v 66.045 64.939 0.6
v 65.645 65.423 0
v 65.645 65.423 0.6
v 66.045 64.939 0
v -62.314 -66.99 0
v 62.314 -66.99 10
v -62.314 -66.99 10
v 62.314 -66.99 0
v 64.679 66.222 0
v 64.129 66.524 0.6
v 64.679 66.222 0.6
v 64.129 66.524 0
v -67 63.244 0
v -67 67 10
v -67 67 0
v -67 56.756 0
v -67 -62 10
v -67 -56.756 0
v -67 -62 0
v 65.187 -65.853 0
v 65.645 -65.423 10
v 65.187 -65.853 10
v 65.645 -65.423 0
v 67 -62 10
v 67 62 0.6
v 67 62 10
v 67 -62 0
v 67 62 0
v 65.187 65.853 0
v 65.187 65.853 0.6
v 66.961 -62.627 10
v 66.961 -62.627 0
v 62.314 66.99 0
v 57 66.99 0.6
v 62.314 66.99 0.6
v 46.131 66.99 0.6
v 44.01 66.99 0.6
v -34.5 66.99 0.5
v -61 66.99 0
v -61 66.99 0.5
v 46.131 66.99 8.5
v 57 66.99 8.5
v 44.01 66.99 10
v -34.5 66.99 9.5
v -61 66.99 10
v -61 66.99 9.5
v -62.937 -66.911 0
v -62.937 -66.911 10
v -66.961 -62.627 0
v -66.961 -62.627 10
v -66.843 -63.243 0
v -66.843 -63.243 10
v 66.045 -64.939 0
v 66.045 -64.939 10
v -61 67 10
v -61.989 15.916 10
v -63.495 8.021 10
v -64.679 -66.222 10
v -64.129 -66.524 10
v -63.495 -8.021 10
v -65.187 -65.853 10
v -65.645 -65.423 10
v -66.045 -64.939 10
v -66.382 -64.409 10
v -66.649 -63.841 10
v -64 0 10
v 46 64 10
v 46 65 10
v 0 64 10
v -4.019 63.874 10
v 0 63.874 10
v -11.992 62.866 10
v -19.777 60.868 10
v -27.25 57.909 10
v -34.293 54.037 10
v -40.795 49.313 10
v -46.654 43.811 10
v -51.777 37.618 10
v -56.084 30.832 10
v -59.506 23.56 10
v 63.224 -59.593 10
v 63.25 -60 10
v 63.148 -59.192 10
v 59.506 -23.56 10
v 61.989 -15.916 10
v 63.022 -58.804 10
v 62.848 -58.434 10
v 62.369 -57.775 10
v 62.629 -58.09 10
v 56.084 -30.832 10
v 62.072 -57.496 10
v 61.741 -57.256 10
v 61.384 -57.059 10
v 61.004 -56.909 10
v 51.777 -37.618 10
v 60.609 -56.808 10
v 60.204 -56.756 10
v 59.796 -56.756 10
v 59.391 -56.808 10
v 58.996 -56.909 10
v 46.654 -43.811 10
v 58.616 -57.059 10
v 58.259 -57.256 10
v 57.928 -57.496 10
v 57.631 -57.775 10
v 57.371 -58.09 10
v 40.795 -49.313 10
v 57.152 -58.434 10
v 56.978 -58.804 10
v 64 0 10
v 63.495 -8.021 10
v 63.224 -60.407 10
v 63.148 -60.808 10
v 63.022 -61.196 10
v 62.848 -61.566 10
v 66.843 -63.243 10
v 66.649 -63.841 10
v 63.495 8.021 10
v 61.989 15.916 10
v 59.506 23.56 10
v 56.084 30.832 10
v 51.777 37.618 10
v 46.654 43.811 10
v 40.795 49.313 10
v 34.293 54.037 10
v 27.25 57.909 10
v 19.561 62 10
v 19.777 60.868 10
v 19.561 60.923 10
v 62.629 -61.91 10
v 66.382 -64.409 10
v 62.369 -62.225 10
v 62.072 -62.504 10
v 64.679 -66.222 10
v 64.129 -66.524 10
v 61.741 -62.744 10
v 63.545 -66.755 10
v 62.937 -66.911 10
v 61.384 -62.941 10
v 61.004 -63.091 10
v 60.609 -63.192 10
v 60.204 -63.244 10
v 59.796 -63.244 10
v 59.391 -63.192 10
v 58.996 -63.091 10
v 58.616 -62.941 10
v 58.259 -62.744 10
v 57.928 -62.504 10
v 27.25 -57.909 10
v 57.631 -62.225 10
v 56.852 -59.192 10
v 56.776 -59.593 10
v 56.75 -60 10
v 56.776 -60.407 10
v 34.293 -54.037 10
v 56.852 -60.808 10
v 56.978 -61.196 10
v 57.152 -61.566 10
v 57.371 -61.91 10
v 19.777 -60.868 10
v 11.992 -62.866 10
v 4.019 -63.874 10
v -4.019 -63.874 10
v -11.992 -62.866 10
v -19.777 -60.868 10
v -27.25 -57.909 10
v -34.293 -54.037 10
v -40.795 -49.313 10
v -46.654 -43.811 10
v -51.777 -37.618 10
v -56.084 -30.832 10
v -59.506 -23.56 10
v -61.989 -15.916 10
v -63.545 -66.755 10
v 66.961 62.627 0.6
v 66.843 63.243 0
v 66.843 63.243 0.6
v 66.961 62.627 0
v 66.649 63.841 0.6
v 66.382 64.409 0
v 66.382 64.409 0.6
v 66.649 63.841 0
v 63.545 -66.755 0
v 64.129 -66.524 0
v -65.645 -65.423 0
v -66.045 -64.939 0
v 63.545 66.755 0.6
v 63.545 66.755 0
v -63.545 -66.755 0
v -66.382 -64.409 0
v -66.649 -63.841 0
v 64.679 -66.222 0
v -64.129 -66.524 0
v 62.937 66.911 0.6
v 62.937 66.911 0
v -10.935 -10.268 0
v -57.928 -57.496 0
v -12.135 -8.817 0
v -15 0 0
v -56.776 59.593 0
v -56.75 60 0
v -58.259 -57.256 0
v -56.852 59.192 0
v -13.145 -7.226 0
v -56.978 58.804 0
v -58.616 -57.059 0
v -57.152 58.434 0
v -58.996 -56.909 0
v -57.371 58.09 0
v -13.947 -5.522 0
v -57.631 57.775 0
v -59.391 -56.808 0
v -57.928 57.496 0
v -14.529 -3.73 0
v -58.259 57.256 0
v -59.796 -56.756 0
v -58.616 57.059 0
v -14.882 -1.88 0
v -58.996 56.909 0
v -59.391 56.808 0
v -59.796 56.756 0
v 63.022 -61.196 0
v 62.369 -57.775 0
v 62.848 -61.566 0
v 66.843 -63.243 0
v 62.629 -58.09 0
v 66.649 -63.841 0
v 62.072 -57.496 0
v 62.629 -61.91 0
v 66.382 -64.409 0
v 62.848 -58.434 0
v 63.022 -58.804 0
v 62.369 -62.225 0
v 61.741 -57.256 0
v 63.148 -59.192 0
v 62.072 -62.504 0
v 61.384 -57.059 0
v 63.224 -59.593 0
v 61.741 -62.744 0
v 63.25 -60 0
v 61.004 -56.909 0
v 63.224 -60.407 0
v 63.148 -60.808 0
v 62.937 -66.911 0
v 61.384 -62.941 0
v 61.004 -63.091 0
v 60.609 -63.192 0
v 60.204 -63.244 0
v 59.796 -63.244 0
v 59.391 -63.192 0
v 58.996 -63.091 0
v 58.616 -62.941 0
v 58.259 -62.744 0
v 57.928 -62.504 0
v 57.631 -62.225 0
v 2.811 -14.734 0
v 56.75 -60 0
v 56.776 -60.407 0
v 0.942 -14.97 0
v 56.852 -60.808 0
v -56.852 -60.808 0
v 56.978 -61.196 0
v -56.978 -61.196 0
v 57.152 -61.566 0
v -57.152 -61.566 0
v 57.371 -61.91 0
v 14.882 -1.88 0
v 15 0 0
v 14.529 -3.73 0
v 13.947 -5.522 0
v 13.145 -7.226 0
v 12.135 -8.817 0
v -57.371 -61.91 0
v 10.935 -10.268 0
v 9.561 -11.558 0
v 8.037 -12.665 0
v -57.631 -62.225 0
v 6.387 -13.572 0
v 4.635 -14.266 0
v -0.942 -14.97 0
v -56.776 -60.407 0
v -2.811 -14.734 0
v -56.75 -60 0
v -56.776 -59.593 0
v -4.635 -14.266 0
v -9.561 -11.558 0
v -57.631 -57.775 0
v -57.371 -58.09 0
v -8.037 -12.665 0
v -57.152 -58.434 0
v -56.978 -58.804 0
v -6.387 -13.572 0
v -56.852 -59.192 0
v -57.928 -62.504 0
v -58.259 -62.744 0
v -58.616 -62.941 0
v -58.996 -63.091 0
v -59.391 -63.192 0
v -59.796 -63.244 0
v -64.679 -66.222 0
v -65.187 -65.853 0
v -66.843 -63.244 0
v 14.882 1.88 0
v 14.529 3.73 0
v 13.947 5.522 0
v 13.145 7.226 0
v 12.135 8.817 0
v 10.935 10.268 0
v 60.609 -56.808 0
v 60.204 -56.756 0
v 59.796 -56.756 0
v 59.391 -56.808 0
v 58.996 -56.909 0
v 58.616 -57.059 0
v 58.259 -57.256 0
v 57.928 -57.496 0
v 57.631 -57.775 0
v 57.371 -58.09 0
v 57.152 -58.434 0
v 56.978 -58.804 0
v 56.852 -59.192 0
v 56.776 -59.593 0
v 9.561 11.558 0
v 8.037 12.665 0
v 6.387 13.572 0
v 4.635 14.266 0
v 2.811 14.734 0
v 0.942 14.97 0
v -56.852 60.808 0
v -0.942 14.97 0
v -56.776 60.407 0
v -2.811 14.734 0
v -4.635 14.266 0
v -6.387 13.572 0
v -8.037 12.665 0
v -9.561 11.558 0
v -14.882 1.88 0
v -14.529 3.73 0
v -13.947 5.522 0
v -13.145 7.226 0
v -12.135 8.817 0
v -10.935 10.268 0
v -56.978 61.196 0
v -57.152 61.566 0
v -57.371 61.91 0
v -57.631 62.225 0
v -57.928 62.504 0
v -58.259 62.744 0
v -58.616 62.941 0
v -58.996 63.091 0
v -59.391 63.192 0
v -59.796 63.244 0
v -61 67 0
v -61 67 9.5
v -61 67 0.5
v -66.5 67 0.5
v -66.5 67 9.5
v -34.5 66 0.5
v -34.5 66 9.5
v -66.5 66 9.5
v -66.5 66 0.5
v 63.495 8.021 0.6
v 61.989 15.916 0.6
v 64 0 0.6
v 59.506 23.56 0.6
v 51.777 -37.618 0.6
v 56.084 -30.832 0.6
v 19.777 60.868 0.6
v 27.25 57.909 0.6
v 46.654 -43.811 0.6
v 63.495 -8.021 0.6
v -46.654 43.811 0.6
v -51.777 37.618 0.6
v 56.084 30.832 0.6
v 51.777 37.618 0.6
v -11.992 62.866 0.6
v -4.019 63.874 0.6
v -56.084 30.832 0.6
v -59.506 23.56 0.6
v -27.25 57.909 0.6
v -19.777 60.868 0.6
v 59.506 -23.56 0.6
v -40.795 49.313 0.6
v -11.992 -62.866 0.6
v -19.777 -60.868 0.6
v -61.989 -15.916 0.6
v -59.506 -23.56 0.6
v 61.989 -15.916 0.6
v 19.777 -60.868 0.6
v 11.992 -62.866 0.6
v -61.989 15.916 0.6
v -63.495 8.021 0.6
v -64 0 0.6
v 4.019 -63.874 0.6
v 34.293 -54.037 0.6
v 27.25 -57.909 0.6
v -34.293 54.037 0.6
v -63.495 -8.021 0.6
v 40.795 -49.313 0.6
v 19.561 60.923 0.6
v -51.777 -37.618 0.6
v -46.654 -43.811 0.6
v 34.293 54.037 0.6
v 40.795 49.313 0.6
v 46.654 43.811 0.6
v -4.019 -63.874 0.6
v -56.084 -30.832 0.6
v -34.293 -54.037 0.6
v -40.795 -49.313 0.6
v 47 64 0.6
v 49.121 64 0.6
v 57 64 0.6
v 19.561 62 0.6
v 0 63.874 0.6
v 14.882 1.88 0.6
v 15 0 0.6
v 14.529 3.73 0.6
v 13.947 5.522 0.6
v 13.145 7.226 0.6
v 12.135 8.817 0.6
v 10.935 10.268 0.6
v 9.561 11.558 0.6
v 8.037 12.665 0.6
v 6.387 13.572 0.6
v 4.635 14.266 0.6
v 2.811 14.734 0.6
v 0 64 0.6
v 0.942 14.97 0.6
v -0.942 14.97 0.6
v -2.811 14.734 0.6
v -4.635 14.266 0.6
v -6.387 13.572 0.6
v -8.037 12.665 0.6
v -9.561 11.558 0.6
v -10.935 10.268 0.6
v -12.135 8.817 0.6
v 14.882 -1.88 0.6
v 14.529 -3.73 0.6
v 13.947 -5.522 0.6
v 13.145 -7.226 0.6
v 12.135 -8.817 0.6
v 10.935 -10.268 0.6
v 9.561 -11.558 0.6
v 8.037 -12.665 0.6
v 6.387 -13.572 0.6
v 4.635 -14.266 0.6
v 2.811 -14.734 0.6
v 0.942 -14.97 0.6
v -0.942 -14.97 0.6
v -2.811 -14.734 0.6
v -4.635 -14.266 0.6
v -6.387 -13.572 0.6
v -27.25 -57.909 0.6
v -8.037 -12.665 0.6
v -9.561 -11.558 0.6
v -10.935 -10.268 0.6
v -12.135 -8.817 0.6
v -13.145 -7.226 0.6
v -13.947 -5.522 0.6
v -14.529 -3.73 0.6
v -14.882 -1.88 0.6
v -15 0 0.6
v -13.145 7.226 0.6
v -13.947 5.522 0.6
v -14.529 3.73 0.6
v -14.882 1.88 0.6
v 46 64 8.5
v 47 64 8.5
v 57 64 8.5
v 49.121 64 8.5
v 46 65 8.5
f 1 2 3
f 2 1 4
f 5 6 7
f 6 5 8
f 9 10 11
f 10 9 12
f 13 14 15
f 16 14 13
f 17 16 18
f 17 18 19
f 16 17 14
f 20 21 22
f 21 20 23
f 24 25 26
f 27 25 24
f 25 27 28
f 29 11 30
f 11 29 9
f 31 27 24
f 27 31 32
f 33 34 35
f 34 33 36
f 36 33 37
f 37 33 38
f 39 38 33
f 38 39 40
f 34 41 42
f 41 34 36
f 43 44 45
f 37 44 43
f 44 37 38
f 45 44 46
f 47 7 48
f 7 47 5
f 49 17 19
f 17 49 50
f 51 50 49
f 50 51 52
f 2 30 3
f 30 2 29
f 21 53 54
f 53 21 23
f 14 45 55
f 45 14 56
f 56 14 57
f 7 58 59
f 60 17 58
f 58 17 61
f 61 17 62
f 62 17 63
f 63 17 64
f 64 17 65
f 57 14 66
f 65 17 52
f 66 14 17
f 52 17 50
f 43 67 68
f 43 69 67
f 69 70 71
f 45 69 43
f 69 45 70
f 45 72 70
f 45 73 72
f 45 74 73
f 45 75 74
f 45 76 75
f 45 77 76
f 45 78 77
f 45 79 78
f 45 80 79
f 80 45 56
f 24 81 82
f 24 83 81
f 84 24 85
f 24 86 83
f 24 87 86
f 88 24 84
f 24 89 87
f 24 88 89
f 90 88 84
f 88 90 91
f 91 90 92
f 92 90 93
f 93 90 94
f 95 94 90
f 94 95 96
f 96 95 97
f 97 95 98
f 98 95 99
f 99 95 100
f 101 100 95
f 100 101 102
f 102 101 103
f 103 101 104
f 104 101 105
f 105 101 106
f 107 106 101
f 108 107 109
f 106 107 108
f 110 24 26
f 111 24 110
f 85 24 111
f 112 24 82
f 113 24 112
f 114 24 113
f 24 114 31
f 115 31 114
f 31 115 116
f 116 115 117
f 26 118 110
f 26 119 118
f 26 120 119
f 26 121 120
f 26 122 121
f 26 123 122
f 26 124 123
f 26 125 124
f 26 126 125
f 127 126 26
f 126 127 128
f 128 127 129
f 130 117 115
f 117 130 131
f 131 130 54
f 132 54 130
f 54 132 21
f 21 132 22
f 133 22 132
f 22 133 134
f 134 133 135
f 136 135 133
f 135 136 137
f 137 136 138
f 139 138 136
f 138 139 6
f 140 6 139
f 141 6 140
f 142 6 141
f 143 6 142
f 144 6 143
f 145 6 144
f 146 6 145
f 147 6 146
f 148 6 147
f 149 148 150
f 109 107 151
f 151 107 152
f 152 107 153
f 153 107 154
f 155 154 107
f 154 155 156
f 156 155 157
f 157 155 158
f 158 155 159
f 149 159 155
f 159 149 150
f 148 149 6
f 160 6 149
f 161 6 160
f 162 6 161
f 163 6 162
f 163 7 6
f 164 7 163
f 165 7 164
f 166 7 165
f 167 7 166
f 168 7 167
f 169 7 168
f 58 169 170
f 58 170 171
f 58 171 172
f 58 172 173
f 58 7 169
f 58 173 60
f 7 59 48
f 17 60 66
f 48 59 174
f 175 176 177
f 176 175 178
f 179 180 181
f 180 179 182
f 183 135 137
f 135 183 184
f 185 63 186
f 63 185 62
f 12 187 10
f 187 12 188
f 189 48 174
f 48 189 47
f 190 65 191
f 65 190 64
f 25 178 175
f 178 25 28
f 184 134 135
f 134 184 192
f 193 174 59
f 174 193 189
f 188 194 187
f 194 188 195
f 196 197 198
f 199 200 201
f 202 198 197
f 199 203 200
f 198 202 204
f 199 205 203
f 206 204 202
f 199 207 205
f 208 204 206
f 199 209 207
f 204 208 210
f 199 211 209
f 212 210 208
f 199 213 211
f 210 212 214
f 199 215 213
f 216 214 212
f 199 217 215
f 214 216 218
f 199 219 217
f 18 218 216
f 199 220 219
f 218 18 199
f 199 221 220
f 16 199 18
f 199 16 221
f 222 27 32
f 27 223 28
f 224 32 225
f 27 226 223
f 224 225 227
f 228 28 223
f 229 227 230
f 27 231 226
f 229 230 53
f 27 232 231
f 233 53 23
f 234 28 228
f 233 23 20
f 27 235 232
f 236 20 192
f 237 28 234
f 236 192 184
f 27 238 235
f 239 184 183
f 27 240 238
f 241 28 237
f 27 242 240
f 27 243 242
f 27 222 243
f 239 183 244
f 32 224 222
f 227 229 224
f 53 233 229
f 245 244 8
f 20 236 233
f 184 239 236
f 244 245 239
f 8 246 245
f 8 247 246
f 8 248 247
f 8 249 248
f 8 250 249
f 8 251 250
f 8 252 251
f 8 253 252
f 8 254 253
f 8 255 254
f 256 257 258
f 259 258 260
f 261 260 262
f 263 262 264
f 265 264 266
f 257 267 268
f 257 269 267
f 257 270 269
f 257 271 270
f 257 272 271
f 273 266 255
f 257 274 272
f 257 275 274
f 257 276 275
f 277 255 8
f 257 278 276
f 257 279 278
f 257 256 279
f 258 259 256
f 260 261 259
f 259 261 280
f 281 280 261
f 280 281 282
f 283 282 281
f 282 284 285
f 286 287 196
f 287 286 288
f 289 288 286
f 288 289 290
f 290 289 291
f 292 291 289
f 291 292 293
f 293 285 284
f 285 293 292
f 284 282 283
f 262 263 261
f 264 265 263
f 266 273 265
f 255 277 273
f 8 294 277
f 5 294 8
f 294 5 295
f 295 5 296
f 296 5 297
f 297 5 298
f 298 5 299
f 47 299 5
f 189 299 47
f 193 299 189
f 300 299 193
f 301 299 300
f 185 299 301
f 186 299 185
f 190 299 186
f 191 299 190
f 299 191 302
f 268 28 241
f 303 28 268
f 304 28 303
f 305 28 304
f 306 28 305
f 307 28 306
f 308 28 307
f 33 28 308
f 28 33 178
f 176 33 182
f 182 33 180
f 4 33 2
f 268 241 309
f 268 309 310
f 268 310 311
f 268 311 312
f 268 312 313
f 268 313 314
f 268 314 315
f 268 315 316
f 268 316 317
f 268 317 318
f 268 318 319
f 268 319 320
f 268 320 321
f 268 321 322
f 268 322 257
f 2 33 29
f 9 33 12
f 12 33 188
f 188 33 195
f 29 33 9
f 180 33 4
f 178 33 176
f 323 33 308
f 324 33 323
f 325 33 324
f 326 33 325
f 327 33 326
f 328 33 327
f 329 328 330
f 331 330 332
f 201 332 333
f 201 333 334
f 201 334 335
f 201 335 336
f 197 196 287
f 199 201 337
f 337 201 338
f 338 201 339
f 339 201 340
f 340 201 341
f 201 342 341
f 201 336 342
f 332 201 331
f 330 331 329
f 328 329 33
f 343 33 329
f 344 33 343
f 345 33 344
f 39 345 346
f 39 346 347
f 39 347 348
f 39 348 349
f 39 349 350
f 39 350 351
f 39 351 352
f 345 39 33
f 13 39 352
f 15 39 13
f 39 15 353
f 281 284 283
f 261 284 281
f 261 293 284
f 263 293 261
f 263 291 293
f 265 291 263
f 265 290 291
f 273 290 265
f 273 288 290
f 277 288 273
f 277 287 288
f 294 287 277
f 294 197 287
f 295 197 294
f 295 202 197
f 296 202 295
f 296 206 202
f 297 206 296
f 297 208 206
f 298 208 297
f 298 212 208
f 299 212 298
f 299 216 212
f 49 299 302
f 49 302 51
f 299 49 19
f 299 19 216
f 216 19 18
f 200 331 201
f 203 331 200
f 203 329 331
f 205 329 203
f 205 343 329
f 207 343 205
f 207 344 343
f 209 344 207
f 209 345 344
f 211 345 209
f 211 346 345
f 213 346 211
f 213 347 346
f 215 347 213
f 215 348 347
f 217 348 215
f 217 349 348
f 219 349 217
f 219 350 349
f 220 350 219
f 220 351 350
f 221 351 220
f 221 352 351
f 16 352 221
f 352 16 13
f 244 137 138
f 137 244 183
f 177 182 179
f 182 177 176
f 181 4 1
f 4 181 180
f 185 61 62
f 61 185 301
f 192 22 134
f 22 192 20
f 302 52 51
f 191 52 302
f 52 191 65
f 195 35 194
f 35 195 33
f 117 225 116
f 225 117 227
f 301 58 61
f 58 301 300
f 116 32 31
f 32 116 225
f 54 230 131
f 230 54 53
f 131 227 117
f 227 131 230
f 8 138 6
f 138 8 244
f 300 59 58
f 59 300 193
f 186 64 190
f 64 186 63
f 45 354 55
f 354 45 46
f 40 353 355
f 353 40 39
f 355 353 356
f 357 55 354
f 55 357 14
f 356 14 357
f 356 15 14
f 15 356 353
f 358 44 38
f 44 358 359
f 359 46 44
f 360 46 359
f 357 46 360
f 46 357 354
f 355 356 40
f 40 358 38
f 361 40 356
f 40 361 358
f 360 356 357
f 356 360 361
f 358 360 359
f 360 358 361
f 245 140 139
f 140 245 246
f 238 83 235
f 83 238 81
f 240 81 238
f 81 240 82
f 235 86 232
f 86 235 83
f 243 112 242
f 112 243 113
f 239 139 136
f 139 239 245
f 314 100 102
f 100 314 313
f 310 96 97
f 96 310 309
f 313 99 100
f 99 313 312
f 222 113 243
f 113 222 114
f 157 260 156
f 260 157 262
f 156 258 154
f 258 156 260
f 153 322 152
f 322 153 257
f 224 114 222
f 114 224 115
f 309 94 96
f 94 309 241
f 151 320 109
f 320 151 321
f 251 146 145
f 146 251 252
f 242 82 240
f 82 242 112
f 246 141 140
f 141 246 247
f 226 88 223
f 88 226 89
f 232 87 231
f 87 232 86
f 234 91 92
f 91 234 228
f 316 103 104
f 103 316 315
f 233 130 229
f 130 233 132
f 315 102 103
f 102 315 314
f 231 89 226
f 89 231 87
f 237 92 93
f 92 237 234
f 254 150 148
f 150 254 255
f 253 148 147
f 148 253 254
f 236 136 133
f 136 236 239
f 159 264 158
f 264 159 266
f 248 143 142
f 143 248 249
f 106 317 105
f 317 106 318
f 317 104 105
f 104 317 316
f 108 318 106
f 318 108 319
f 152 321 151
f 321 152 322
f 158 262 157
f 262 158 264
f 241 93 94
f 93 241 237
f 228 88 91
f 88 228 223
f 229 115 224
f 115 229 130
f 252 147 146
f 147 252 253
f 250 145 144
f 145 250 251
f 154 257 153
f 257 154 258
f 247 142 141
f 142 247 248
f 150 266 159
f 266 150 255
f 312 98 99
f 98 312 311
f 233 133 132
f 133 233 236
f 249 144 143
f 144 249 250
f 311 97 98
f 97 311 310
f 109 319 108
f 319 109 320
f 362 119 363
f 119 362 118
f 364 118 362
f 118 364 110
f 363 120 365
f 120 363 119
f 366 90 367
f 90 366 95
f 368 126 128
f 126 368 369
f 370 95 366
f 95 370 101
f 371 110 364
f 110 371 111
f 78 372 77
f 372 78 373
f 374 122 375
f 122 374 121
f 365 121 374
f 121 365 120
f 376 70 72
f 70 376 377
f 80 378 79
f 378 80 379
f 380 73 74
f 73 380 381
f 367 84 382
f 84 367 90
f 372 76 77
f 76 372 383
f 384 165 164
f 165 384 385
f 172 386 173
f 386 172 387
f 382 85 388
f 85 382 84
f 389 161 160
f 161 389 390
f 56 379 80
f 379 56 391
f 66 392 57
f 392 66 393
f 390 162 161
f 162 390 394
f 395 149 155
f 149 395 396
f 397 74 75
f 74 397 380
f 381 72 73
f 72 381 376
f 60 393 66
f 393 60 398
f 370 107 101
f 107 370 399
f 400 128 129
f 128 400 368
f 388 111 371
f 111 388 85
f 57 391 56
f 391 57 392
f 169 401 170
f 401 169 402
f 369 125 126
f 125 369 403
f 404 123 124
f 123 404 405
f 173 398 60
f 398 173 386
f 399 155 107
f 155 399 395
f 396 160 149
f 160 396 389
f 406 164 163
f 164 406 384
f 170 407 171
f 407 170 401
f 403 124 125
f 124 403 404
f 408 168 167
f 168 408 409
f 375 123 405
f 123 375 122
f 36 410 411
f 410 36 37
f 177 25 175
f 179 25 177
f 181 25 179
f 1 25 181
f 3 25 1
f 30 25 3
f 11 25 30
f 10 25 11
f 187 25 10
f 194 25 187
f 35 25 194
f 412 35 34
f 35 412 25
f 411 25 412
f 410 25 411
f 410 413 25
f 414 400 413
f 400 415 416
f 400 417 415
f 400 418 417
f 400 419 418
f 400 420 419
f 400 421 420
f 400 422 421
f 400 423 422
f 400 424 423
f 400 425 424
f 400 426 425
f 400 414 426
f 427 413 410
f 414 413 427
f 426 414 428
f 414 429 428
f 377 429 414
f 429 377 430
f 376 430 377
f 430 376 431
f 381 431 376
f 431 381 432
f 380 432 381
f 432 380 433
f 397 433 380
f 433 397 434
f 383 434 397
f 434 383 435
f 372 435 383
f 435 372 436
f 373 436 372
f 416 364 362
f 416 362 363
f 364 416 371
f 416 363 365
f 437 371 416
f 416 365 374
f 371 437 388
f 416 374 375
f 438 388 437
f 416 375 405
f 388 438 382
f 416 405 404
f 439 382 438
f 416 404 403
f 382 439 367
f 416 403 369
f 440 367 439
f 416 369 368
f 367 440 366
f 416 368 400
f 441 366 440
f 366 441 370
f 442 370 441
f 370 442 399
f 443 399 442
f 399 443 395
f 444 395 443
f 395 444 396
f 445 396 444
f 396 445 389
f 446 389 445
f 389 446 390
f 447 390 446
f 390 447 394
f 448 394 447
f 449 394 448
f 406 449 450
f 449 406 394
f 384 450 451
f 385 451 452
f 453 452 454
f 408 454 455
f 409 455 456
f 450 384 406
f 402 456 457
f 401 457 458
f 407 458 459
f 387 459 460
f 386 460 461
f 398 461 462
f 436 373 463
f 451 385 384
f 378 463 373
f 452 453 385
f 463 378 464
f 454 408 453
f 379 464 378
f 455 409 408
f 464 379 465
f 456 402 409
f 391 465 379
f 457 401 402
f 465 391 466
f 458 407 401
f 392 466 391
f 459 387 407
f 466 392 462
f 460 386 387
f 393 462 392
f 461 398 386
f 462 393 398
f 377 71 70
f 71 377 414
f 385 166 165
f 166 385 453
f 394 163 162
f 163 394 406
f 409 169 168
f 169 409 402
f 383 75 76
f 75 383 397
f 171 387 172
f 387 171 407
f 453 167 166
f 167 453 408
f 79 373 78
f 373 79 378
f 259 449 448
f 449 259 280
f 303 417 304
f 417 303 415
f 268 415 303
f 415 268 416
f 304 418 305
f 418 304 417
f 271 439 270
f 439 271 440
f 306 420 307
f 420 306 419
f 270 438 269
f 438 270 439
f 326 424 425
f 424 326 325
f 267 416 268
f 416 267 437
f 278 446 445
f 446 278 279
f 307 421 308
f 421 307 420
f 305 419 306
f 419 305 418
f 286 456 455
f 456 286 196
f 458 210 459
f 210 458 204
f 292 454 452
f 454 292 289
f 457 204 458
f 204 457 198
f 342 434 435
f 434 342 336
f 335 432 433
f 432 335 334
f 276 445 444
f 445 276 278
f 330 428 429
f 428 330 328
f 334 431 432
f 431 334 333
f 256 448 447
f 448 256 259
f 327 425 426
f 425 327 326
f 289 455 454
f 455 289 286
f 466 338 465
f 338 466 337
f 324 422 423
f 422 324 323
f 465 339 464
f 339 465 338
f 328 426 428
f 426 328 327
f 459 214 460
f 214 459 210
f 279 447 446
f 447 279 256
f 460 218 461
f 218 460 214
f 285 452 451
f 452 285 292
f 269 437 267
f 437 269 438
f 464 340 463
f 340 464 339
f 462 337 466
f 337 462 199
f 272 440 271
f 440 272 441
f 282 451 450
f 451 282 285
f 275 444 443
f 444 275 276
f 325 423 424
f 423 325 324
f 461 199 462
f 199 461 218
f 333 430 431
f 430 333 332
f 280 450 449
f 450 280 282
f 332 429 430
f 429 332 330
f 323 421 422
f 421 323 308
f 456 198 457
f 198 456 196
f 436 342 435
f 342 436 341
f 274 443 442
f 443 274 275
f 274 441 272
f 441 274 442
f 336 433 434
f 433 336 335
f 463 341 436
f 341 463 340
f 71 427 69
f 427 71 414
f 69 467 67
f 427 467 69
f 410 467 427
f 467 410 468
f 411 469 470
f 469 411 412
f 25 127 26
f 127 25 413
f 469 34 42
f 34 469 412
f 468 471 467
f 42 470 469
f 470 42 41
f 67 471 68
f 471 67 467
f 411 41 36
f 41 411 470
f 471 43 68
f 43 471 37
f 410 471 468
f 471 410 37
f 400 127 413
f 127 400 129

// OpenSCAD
$fn = 50;


difference() {
	union() {
		hull() {
			translate(v = [-62.0000000000, 62.0000000000, 0]) {
				cylinder(h = 10, r = 5);
			}
			translate(v = [62.0000000000, 62.0000000000, 0]) {
				cylinder(h = 10, r = 5);
			}
			translate(v = [-62.0000000000, -62.0000000000, 0]) {
				cylinder(h = 10, r = 5);
			}
			translate(v = [62.0000000000, -62.0000000000, 0]) {
				cylinder(h = 10, r = 5);
			}
		}
		translate(v = [-67.0000000000, 61.0000000000, 0]) {
			cube(size = [6, 6, 10]);
		}
	}
	union() {
		translate(v = [-67.5000000000, -60.0000000000, -250.0000000000]) {
			rotate(a = [0, 0, 0]) {
				difference() {
					union() {
						hull() {
							translate(v = [7.5000000000, 0, 0]) {
								cylinder(h = 250, r = 3.2500000000, r1 = 3.2500000000, r2 = 3.2500000000);
							}
							translate(v = [-7.5000000000, 0, 0]) {
								cylinder(h = 250, r = 3.2500000000, r1 = 3.2500000000, r2 = 3.2500000000);
							}
						}
					}
					union();
				}
			}
		}
		translate(v = [-67.5000000000, 60.0000000000, -250.0000000000]) {
			rotate(a = [0, 0, 0]) {
				difference() {
					union() {
						hull() {
							translate(v = [7.5000000000, 0, 0]) {
								cylinder(h = 250, r = 3.2500000000, r1 = 3.2500000000, r2 = 3.2500000000);
							}
							translate(v = [-7.5000000000, 0, 0]) {
								cylinder(h = 250, r = 3.2500000000, r1 = 3.2500000000, r2 = 3.2500000000);
							}
						}
					}
					union();
				}
			}
		}
		translate(v = [-66.5000000000, 66.0000000000, 0.5000000000]) {
			cube(size = [32, 1, 9.0000000000]);
		}
		translate(v = [60.0000000000, -60.0000000000, -50.0000000000]) {
			cylinder(h = 100, r = 3.2500000000);
		}
		translate(v = [0, 0, 0.6000000000]) {
			cylinder(h = 12.4000000000, r = 64.0000000000);
		}
		translate(v = [0, 0, -5.0000000000]) {
			cylinder(h = 10, r = 15.0000000000);
		}
		translate(v = [0.0000000000, 62.0000000000, 0.6000000000]) {
			cube(size = [67.0000000000, 2, 12.4000000000]);
		}
		translate(v = [57.0000000000, 62.0000000000, 0.6000000000]) {
			cube(size = [10, 5, 12.4000000000]);
		}
		translate(v = [46.0000000000, 62.0000000000, 8.5000000000]) {
			cube(size = [21, 5, 1.5000000000]);
		}
		translate(v = [43.2500000000, 67.7500000000, 0.6000000000]) {
			rotate(a = [0, 0, -45]) {
				cube(size = [7.5000000000, 1.5000000000, 12.4000000000]);
			}
		}
		translate(v = [12.0610000000, 60.0000000000, 0.6000000000]) {
			cube(size = [7.5000000000, 2, 9.4000000000]);
		}
	}
}
